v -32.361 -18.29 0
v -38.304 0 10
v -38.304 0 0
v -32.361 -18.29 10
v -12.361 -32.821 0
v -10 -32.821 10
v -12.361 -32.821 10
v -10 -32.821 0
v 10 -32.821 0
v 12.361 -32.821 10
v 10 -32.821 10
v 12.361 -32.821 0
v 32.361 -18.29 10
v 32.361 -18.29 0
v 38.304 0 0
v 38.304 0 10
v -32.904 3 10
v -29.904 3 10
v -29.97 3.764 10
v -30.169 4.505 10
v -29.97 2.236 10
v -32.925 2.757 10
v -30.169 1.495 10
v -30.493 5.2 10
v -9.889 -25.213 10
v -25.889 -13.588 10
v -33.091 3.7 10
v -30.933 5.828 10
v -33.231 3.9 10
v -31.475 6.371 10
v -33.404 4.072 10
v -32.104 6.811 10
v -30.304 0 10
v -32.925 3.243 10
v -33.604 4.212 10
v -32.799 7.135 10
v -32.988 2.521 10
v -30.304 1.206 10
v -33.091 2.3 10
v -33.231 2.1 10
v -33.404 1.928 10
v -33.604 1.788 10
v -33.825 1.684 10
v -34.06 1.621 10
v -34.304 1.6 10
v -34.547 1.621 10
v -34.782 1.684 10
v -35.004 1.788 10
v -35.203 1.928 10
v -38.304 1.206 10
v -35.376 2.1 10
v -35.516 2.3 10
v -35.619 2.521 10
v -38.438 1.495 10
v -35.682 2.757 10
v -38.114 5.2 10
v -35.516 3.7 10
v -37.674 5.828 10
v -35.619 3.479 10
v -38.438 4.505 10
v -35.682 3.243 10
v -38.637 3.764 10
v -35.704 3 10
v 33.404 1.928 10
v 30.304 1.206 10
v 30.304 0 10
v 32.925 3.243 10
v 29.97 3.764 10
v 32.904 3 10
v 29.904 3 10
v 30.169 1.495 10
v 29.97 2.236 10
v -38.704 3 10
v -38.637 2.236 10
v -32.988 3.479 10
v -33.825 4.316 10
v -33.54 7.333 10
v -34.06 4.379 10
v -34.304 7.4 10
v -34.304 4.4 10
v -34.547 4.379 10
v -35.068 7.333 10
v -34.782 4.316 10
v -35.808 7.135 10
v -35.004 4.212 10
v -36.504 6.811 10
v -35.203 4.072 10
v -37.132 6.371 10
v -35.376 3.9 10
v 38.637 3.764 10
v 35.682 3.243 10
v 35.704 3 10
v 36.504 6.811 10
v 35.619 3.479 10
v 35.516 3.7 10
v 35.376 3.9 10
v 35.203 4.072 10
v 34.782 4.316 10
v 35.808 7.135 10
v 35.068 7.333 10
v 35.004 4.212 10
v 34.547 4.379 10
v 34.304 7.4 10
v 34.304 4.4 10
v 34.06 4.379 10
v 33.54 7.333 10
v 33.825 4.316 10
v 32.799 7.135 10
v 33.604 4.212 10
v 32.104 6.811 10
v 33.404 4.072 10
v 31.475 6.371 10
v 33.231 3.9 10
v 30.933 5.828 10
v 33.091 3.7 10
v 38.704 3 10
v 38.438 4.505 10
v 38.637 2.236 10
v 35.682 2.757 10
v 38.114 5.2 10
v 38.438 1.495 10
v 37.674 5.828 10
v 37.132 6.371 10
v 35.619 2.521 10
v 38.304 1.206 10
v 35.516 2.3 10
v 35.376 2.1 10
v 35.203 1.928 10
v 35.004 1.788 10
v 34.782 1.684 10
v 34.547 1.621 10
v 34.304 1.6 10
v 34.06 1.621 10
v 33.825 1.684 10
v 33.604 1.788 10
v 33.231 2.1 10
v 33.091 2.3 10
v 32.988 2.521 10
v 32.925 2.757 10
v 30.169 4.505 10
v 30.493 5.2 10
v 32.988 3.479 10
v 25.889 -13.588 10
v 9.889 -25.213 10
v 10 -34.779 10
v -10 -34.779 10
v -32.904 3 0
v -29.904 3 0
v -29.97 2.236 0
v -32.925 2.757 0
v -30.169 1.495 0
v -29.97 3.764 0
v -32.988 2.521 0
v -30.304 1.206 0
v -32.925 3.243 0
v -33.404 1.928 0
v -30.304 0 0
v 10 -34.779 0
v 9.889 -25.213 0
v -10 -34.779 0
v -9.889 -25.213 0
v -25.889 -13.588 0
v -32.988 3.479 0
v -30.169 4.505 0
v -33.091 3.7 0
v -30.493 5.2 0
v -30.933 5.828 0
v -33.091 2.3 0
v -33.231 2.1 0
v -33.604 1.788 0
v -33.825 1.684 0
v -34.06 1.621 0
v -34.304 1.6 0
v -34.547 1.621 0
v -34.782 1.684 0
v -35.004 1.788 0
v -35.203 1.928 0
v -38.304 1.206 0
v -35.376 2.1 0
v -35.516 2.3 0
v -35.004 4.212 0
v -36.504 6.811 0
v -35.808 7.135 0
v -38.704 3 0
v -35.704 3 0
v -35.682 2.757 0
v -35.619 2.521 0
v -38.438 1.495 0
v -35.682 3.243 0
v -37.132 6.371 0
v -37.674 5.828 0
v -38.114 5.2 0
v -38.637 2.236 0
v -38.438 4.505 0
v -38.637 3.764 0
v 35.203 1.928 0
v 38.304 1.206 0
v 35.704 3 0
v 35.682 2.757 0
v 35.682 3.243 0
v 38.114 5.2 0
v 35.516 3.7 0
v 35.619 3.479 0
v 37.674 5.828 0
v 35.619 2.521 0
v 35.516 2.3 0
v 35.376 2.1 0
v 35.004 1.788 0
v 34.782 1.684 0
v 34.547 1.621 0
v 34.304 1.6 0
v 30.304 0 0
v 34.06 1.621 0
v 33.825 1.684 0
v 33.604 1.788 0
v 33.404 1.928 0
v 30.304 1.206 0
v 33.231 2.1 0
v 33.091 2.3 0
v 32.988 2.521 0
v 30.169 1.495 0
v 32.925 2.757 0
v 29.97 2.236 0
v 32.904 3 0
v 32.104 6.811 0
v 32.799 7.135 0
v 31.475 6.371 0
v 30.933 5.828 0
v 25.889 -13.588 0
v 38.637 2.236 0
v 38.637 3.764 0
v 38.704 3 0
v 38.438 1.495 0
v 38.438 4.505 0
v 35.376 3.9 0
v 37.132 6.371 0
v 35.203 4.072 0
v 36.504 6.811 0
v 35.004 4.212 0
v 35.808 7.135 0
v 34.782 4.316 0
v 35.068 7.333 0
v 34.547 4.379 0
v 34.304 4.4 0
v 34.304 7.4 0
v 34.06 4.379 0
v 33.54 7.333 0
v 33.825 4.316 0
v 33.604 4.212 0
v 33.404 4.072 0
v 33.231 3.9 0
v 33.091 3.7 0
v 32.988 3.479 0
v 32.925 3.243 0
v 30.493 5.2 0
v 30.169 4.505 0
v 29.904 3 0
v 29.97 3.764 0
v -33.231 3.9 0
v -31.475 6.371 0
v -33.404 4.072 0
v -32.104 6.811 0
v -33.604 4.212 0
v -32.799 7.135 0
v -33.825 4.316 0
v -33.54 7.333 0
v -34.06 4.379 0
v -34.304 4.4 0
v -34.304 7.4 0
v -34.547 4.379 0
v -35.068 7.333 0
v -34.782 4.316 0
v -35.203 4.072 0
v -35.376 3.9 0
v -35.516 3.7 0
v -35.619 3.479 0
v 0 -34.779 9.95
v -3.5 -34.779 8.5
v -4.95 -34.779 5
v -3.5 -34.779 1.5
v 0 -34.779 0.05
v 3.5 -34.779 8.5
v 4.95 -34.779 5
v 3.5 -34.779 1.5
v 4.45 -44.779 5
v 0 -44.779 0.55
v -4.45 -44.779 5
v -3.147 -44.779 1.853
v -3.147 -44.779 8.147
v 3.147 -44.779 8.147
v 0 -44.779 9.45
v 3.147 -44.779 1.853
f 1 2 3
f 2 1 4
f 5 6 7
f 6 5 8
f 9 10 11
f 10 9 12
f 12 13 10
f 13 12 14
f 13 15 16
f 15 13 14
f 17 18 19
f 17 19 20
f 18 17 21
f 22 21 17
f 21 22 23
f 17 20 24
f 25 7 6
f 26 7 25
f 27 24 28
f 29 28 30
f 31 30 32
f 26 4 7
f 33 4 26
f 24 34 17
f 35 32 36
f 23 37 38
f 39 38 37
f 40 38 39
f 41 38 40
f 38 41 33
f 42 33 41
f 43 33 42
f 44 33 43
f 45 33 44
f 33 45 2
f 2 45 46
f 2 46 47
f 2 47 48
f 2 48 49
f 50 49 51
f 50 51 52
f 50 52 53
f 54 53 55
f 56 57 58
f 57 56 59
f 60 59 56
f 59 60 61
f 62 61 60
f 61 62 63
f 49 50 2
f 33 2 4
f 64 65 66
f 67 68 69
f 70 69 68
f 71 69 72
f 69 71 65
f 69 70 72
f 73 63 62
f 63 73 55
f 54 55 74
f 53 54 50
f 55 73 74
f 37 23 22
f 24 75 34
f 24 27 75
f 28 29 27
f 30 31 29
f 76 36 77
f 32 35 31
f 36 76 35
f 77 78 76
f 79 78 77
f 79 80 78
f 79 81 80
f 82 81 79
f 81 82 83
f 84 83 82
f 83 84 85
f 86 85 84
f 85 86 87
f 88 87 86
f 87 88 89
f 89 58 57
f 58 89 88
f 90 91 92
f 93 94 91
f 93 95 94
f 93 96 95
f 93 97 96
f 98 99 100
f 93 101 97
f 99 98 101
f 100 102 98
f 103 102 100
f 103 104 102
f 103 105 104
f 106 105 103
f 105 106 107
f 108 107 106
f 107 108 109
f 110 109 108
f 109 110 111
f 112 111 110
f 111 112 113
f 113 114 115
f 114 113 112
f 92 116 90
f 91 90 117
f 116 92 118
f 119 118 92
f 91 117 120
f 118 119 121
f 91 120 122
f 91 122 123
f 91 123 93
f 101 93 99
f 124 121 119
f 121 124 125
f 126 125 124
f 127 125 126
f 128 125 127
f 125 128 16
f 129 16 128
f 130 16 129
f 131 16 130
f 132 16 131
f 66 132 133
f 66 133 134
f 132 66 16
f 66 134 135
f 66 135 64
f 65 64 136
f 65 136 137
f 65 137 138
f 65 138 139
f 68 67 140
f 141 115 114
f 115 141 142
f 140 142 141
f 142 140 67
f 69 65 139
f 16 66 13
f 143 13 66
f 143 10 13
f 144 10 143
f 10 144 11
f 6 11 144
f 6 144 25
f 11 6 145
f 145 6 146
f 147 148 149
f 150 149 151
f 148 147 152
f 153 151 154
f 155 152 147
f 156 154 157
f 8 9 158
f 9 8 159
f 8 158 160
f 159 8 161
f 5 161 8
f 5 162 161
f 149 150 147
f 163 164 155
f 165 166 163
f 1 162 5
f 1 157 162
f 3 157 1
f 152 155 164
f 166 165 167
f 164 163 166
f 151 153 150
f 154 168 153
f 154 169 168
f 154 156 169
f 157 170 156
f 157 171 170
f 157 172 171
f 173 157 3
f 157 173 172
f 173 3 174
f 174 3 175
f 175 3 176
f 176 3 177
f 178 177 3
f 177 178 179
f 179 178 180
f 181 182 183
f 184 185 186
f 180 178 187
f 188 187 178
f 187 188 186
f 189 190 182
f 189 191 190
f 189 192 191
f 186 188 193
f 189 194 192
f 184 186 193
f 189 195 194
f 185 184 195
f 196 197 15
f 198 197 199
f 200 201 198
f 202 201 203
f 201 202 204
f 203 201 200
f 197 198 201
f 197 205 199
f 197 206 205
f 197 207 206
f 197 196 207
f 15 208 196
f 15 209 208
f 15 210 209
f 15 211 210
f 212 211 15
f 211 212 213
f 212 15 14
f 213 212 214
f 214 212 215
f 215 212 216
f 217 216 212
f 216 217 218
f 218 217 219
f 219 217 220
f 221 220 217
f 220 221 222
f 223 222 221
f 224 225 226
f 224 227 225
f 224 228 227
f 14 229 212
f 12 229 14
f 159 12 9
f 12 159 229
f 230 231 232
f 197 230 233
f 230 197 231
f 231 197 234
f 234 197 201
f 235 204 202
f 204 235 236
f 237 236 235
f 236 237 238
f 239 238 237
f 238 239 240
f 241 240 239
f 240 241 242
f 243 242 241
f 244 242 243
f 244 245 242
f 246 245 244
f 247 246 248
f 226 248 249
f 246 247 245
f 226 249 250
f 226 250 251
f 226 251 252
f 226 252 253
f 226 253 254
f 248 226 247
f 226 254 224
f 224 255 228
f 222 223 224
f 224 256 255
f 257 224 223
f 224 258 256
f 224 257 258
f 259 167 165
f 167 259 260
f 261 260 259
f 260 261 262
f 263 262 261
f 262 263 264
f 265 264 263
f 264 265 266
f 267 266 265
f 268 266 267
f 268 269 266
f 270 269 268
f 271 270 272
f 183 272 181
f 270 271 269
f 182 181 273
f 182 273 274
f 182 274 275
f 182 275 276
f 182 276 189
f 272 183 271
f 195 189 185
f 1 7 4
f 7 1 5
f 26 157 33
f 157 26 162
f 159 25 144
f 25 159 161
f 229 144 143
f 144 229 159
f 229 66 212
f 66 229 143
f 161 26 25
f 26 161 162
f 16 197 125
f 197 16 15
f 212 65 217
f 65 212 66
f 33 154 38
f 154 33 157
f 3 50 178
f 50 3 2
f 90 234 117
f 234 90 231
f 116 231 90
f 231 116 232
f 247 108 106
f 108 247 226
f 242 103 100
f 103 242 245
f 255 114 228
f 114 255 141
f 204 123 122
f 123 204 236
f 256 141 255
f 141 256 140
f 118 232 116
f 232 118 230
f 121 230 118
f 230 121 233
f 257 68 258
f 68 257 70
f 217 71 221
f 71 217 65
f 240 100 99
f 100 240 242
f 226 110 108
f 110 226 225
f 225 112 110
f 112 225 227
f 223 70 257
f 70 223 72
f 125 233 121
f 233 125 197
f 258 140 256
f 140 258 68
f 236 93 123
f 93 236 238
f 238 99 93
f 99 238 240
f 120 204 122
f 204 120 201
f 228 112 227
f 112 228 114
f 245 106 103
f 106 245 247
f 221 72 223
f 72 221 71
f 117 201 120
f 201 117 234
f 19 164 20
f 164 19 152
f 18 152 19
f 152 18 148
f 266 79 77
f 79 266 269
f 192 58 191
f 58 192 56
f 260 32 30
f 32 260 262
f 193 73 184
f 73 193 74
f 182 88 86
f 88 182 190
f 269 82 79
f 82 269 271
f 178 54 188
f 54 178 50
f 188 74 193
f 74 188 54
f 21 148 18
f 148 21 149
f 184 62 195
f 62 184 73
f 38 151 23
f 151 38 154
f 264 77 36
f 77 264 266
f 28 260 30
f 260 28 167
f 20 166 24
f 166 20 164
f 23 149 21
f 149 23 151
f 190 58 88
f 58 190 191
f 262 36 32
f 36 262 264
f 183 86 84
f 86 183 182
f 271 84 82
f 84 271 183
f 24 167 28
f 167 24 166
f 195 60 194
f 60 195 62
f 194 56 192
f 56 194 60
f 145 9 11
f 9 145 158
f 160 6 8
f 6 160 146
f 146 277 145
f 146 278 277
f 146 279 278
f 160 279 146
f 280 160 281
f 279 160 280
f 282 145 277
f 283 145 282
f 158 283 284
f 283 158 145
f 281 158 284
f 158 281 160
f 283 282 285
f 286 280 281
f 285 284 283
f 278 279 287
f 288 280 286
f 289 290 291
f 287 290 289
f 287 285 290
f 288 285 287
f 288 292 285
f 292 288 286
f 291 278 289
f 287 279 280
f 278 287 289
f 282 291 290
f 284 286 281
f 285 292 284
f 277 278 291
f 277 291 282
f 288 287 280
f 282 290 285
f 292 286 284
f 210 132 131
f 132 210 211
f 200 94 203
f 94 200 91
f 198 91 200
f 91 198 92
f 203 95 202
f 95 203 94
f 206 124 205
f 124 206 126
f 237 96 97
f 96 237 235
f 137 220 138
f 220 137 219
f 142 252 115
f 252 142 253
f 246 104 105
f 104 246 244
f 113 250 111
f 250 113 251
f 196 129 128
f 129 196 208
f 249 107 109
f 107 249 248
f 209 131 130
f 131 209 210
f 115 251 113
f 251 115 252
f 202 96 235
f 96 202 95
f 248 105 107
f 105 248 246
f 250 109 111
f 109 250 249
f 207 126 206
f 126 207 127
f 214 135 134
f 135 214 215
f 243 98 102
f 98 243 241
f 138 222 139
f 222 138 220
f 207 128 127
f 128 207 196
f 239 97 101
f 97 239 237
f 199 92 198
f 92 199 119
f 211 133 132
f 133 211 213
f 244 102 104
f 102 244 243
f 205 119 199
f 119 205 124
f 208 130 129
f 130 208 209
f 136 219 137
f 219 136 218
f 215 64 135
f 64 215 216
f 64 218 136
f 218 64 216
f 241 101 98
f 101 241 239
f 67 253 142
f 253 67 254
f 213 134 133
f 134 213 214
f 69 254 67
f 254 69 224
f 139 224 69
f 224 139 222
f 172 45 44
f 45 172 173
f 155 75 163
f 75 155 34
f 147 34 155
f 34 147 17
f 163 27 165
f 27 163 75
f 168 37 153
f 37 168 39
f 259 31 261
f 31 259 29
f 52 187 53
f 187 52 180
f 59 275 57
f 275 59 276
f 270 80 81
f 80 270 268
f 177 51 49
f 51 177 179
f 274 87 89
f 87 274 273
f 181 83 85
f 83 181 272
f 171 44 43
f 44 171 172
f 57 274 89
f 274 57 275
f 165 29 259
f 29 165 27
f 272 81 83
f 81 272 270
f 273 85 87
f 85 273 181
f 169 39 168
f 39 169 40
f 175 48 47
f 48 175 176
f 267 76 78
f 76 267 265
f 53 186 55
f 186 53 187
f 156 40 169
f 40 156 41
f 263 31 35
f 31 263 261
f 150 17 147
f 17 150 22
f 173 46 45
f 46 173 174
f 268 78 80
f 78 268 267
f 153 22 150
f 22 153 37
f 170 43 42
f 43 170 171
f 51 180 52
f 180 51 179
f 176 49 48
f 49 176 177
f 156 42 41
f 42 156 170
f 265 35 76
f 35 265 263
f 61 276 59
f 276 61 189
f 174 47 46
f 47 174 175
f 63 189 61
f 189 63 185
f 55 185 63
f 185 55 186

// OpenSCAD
// Loose filament spindle.
// ======================
//
// This spindle is designed to insert into a loose spool of filament and spin
// around a provided axis either on the back of a Replicator or externally.
//
// Terminology:
//
//	Hub - centre support for the spindle - has embedded spokes.
//	Centre Hole - the hole in the centre of the hub.
//	Spoke - the spoke connecting the hub to the bracket.
//	Bracket - the outer support structure designed to hold the spool of filament.
//	Plug - the nub of plastic which inserts into plug holes in the spindle
// 		or the spokes.
//
// Notes:
//
//	Check that you can assemble a full set of 3 spokes and brackets which
//	will fit loosely inside the spool of filament.
//
//	The idea is to NOT stretch the filament inserting the full hub.   There
///  is a need for loose filament to have some room to move as it unwinds. 
//
//	Use the following sequence for insertion:
//
//		1) Insert one spoke/bracket set into the hub and insert this
//			into the spool of filament.
//		2) Insert the second spoke/bracket set into the spool of
//			filament and then into the hub.
//		3) Insert the third spoke/bracket set into the spool of
//			filament and then tilting the hub up slightly insert
//			into the final plug hole on the hub.
//
//	You should print Brackets with support (for the plug).
//	You should print Hubs with support (for the plug holes). NO, non è necessario!
//	Print Spokes vertically at 100% - NO support is best. Horizontally
//		printed spokes will split.
// 
// Original Author: shaunp
// Url: https://www.thingiverse.com/thing:62710
//
// This version: https://www.thingiverse.com/thing:3079677

/* [Global] */

// Which part are you going to build?
part = "Bracket"; // [Hub:Hub, Spoke:Spoke, Bracket:Bracket]

/* [Hub] */

// Hub: Internal diameter
Centre_Hole_Diameter = 35; // [20:80]

// Hub: Thickness (width of surface with plug holes)
Hub_Thickness = 15; // [15:50]

/* [Spoke] */

// Use 20 as a starting point for replicator hub.
Spoke_Length =  30; // [10:100]

/* [Bracket] */

// Bracket: diameter of the (circumscribed circle of the) external decagon
Bracket_Diameter = 80;  // [40:100]

// Bracket:
Bracket_Arc = 165; // [36:324]

// Bracket: width of external surface
Bracket_Thickness = 10;

// Bracket: thickness (between internal and external surfaces)
Bracket_Depth = 8 ;

// Bracket: vertical prolong 
Bracket_Prong_Length = 3;

/* [Hidden] */
     
Angular_Resolution = 0.1;
Octagon_Resolution = 45 ;
Decagon_Resolution = 36 ;

Plug_Height = 10;  // plug height
Plug_Hole_Width = 10;  // plug hole width
Plug_Wall_Thickness = 3;   // plug wall thickness
Plug_Taper = 0.5; // Plug_Taper of plug in mm
Plug_Clearance = 0.10; // Difference between plug and plughole diameters

Filiament_Hole = 2.8;  // Hole in bracket when storing filament.

/////////////////////////////////////////////////////////////////////////////////////////////////////////////////

print_part();

module print_part() {	
	if (part == "Hub") {
		Hub();
	} else if (part == "Spoke") {
		Spoke();
	} else {
		Bracket();
	}
}

module highlight(this_tab) {
  if (preview_tab == this_tab) {
    color("red") child(0);
  } else {
    child(0);
  }
}

module Hub() {
	Hole_Offset = Hub_Thickness*.5*-1;
    // Add 1 to offset for Repg <<<<<<<<<<<<<
	Plug_Offset = ((Centre_Hole_Diameter/2) + Plug_Height+1)*-1;  

    // Main Hub	
	difference() {
        // Add 1 to radius for Repg <<<<<<<<<<<
		tube(Hub_Thickness,(Centre_Hole_Diameter + 1 + (Plug_Height*2))/2.0,Plug_Height);  

        // Radial Holes.
		union(){
			rotate([0,90,0]) translate([Hole_Offset,0,Plug_Offset])   plugHole();
			rotate([120,90,0]) translate([Hole_Offset,0,Plug_Offset])   plugHole();
			rotate([240,90,0]) translate([Hole_Offset,0,Plug_Offset])   plugHole();
		}
	}
}

module tube(height, radius, wall) {
	difference(){
		cylinder(height, r=radius, $fa=Angular_Resolution);
		cylinder(height, r=radius-wall, $fa=Angular_Resolution);
	}
}

module octagontube(height, radius, wall) {
	difference(){
		cylinder(height, r=radius, $fa=Octagon_Resolution);
		cylinder(height, r=radius-wall, $fa=Octagon_Resolution);
	}
}

module decagontube(height, radius, wall) {
	difference(){
        // Crea un cilindro decagonale centrato nel piano XY, di altezza height
		cylinder(height, r=radius, $fa=Decagon_Resolution);
		cylinder(height, r=radius-wall, $fa=Decagon_Resolution);
	}
}

function decagonXoffset(radius, angle) =
    let(
        dAlpha = (angle - 18) % 36,
        d = radius * (1 - (tan(72) / (sin(dAlpha) + (cos(dAlpha)*tan(72))))),
        beta = (1 + floor((angle - 18) / 36)) * 36, // Angle of the current decagon side
        offset = d * (sin(angle) + cos(angle) / tan(beta))
    ) (radius * sin(angle)) - offset;

module plugHole() {
      cylinder(Plug_Height, Plug_Hole_Width/2, Plug_Hole_Width/2 - Plug_Taper, fa=Octagon_Resolution);
}

module plug() {
      cylinder(Plug_Height,(Plug_Hole_Width-Plug_Clearance)/2,(Plug_Hole_Width-Plug_Clearance)/2 - Plug_Taper,$fa=Octagon_Resolution);
}

module Spoke() {
	difference() {
		union() {
  			octagontube(Spoke_Length,(Plug_Hole_Width+Plug_Wall_Thickness)/2,Plug_Wall_Thickness*2/2,$fa=Octagon_Resolution);
  			translate([0,0,Spoke_Length*0.99]) plug();
		}
		plugHole();
	}
}

module Bracket_Build(diameter, height, thickness, arc, extend){
    if (diameter < 36) {
        diameter = 36;
    } else if (diameter > (360 - 36)) {
        diameter = 360 - 36;
    }
    radius = diameter / 2; // radius is guaranteed between 18 and 162
    
    // Magical math calculations!
    offsetY = radius * abs(cos(arc/2));
    offsetExt = decagonXoffset(radius, arc / 2);
    offsetInt = decagonXoffset(radius - thickness, acos(radius * cos(arc / 2) / (radius - thickness)));
    offsetMid = (offsetInt + offsetExt) / 2;
    
    difference() {
        union() {
            // Build an arc of a decagon tube as base for bracket.
            difference(){
                translate([0, offsetY, 0]) decagontube(height, radius, thickness);        
                translate([-radius, 0, 0]) cube([diameter, diameter, height]);
            } 
            
            // Extend Forks.
            if (extend > 0 ) {
                translate([offsetInt, 0, 0]) cube([offsetExt - offsetInt, extend, height]);
                translate([-offsetExt, 0, 0]) cube([offsetExt - offsetInt, extend, height]);
            }
            
            // Add rounded top to forks.
            translate([offsetMid, extend, 0]) cylinder(height, r=thickness*0.55, $fn=36);
            translate([-offsetMid, extend, 0]) cylinder(height, r=thickness*0.55, $fn=36);
            
            // Add Plug.	
            translate([-height, offsetY - radius, 0]) cube([height*2, height/4, height]);
            translate([0, offsetY - radius, height/2]) rotate([90, 0, 0]) plug();
        } // union
        
        // Insert filament holes.
        union() {
            translate([offsetMid, extend, 0]) cylinder(height, r=Filiament_Hole/2, $fn=36);
            translate([-offsetMid, extend, 0]) cylinder(height, r=Filiament_Hole/2, $fn=36);
        }
    } // difference
}

module Bracket(){
	Bracket_Build(Bracket_Diameter, Bracket_Thickness, Bracket_Depth, Bracket_Arc, Bracket_Prong_Length);
}
